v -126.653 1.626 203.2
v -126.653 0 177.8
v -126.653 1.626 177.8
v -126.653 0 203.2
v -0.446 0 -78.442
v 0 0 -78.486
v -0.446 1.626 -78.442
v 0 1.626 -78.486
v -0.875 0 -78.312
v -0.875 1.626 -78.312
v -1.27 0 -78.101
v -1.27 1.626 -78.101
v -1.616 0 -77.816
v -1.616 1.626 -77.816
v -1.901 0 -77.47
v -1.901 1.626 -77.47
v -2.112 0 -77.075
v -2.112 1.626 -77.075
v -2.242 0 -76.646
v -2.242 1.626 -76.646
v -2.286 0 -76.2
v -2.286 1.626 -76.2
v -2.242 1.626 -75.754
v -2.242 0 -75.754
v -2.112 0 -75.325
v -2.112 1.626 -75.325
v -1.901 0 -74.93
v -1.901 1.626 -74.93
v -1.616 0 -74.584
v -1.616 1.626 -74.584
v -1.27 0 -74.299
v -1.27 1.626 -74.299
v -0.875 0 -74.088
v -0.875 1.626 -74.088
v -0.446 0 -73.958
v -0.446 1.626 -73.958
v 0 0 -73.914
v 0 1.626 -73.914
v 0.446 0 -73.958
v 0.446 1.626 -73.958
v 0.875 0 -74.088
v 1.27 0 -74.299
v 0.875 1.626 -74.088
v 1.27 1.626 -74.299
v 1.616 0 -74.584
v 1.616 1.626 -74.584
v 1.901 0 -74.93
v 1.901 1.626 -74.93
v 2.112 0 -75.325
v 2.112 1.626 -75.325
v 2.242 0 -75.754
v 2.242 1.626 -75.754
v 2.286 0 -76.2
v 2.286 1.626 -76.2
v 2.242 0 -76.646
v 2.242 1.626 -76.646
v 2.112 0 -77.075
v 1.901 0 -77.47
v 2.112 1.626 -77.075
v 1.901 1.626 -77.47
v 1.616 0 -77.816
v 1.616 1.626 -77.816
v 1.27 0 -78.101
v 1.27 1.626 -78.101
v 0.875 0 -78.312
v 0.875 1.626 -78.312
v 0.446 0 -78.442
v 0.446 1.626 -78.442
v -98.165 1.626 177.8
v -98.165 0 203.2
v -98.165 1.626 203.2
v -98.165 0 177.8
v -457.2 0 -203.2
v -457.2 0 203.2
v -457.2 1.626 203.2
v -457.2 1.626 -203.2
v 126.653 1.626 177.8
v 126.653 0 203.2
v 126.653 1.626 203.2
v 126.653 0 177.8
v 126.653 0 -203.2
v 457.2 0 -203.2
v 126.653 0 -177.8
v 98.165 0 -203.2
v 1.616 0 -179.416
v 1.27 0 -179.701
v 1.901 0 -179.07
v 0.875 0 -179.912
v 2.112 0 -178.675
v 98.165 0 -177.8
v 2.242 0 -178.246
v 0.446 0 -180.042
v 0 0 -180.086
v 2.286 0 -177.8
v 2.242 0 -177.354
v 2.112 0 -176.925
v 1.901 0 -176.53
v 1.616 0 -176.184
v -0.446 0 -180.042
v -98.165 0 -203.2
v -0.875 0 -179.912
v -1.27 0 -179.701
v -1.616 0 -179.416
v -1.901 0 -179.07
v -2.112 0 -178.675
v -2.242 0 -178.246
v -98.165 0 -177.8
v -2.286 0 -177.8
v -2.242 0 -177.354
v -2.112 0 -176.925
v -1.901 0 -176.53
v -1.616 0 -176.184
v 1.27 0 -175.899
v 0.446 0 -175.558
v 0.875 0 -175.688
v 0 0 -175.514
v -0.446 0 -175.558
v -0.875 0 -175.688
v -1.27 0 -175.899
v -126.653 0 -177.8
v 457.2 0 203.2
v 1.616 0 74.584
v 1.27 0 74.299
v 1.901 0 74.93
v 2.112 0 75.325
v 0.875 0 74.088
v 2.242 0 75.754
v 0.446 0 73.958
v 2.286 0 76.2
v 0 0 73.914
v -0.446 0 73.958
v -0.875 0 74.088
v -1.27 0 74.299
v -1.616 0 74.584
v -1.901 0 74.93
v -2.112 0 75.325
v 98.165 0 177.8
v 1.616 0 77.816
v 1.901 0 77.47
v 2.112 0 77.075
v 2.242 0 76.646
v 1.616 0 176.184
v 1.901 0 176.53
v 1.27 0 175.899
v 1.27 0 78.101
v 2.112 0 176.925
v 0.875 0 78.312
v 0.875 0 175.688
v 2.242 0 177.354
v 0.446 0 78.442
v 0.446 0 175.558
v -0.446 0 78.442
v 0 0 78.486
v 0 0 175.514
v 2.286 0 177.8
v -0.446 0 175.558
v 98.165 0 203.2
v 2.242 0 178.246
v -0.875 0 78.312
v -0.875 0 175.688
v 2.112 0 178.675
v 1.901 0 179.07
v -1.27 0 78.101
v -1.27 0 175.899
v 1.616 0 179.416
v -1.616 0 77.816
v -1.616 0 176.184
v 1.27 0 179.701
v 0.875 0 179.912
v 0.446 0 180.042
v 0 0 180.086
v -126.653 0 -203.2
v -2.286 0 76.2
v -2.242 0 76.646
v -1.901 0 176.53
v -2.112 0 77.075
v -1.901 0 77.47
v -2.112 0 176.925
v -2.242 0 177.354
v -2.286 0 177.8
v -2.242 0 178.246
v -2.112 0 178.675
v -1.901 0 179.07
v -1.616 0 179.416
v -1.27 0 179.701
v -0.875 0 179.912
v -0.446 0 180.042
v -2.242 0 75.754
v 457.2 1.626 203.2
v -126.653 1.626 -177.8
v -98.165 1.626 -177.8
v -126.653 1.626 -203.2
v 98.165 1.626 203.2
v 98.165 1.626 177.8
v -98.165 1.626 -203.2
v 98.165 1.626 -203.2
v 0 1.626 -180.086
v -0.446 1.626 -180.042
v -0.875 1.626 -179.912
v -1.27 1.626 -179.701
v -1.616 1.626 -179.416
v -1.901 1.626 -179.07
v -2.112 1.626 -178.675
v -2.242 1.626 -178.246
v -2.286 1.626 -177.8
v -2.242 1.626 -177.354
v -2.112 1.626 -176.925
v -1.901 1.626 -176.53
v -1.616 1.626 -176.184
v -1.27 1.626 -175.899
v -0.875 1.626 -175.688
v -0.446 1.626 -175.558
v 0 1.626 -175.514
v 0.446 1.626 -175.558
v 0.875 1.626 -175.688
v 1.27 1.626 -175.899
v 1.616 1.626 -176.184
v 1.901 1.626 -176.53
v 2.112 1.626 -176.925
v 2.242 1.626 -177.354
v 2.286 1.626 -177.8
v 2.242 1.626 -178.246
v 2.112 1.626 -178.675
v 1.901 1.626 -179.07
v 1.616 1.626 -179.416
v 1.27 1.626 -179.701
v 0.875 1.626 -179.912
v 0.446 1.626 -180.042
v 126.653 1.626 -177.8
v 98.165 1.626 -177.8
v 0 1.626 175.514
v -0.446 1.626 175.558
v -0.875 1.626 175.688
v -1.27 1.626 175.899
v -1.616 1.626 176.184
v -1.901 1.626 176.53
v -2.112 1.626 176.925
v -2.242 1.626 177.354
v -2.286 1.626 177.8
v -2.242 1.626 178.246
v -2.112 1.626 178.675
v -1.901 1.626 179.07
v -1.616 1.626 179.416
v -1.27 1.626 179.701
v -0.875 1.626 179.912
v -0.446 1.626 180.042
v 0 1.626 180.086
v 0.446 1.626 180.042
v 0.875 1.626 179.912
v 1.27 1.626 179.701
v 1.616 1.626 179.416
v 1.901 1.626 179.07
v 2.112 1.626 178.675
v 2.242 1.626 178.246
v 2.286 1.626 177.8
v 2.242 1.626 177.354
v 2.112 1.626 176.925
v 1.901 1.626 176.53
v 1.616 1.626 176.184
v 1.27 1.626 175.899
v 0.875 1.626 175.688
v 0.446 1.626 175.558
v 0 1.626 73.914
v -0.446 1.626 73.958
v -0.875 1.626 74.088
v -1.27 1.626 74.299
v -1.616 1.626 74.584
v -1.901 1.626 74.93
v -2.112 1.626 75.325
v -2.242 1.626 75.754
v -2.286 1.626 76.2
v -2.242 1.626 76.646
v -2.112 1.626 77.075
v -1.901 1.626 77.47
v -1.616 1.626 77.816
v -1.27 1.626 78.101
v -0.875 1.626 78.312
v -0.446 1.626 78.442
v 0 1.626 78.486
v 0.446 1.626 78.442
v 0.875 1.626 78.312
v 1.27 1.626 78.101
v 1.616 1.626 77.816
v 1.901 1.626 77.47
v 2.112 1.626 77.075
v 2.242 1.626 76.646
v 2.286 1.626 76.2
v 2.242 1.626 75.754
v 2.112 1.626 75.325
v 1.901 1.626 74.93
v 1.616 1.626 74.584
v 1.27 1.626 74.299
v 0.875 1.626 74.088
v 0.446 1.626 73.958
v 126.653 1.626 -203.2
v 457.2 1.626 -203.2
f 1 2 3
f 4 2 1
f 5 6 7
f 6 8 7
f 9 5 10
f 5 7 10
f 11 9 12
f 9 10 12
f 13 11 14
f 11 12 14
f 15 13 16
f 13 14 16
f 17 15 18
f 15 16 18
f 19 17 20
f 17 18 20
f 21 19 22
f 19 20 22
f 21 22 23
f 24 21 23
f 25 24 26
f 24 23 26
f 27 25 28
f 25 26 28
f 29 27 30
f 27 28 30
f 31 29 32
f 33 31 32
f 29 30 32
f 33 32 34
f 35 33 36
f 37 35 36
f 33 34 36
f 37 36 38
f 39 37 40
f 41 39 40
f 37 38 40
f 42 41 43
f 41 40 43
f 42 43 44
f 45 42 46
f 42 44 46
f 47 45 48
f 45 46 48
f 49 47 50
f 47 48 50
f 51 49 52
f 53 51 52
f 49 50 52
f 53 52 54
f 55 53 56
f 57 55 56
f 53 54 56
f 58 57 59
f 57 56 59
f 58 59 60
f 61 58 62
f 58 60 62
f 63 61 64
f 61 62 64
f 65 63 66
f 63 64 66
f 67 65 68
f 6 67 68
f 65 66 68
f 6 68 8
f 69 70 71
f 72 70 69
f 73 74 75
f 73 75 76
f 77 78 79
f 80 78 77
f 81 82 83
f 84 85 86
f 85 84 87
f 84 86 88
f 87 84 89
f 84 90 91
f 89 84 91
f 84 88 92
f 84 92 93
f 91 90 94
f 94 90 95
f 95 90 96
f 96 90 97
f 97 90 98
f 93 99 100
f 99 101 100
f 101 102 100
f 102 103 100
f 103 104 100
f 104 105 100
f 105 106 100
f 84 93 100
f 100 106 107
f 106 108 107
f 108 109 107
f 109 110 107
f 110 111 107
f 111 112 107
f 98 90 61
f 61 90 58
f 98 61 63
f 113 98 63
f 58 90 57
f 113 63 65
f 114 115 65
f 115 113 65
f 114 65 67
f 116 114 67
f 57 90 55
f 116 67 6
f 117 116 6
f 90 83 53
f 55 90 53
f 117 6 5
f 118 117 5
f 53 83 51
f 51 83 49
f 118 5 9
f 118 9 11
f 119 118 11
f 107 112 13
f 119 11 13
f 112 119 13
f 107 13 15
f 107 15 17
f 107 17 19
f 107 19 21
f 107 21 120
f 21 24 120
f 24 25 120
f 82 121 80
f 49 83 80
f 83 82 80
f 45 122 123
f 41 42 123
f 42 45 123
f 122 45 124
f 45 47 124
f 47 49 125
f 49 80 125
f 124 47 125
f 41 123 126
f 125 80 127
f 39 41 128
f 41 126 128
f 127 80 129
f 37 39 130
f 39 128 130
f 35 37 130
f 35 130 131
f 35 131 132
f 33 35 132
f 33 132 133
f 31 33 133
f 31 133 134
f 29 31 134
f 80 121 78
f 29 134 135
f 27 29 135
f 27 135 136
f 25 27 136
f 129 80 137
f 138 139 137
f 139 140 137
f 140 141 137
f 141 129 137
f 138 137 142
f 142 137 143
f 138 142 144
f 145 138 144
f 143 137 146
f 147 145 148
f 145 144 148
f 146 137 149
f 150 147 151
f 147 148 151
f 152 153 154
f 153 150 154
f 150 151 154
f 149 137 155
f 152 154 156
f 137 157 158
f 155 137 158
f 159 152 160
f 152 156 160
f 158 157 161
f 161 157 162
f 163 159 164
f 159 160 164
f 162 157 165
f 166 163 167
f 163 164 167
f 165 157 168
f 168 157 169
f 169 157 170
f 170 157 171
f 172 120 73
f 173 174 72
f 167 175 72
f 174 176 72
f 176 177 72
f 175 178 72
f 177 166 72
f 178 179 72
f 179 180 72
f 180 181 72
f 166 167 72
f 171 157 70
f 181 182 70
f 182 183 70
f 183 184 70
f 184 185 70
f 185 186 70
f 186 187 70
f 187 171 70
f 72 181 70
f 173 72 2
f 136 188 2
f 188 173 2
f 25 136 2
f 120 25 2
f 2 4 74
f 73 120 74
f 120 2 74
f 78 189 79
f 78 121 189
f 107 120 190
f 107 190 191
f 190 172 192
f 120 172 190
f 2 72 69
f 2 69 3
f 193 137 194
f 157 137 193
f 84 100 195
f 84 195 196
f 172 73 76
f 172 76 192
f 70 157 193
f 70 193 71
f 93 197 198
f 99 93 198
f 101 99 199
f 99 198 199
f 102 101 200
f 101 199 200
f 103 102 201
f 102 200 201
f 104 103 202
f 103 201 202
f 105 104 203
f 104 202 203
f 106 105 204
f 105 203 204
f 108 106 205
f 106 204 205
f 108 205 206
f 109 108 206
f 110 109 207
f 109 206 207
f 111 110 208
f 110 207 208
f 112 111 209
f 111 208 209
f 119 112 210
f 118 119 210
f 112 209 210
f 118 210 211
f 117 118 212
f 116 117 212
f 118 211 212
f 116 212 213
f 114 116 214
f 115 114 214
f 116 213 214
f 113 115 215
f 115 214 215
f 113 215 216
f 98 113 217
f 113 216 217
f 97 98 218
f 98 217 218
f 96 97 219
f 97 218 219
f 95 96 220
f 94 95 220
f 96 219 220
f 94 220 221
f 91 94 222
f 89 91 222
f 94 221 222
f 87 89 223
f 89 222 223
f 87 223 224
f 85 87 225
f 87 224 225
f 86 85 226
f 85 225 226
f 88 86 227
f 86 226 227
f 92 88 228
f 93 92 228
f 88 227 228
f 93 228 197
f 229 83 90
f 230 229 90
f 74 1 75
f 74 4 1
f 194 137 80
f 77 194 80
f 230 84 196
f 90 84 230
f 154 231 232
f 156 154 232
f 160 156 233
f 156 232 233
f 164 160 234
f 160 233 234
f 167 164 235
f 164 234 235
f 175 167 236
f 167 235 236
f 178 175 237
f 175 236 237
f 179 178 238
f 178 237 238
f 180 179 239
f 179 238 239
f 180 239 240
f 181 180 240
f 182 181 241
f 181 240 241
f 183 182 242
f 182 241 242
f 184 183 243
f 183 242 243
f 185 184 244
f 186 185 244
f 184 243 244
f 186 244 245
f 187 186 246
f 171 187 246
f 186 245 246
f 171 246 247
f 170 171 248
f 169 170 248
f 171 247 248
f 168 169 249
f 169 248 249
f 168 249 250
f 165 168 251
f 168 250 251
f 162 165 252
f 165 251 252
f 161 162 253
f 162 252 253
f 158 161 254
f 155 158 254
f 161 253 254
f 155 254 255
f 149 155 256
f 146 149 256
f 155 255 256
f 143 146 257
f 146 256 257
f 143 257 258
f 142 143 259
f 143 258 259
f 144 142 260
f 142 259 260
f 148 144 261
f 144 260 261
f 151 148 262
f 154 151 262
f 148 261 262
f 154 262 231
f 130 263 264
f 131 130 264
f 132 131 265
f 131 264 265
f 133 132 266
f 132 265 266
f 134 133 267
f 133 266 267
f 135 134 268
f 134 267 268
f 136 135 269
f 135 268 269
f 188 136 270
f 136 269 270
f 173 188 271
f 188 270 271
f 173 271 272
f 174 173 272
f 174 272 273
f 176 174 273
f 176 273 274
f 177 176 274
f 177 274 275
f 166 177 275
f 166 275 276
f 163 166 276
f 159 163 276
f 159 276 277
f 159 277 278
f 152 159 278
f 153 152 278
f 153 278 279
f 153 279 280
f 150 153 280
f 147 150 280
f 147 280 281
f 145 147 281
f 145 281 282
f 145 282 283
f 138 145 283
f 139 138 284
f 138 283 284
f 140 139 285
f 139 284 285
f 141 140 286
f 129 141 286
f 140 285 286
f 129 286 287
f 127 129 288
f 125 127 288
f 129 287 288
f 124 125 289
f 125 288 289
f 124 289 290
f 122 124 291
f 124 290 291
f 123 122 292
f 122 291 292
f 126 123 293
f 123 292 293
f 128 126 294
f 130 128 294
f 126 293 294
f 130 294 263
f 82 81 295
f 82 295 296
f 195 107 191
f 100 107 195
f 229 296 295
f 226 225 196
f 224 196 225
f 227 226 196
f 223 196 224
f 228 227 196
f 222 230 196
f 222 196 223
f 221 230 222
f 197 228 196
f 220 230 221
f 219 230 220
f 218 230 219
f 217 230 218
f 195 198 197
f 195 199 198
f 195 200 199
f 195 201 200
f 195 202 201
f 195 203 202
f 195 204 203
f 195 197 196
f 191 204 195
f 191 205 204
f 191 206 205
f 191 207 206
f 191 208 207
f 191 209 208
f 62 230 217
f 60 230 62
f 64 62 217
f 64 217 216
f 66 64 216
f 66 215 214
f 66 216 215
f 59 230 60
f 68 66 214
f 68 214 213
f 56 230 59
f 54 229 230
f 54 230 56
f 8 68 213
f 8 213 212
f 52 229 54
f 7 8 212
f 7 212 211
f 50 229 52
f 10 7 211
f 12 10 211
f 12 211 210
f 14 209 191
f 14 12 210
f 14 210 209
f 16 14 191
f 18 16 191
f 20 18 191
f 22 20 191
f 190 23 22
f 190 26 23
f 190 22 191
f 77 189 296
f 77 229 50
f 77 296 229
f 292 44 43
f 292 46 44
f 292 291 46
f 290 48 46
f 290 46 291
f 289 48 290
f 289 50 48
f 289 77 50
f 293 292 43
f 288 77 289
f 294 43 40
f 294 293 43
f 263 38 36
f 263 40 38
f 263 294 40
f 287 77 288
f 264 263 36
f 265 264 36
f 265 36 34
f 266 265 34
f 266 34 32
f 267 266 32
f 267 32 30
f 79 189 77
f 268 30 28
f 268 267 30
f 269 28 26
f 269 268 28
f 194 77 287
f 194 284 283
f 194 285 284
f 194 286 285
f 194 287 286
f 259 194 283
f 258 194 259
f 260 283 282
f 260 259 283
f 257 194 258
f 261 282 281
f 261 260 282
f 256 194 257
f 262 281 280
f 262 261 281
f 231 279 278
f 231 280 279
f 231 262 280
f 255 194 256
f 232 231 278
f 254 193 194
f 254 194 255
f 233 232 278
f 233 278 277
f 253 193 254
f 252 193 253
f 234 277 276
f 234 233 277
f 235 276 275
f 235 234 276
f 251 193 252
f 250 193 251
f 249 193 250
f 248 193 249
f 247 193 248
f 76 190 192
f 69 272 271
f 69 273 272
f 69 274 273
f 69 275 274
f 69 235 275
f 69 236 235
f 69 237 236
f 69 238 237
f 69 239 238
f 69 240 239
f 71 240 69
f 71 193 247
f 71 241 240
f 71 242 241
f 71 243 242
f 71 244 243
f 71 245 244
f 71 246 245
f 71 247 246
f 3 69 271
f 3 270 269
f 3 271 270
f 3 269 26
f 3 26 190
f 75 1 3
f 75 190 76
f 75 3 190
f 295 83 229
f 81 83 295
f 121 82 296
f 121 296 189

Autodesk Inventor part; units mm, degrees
ref_plane "YZ Plane" through (0, 0, 0) normal (1, 0, 0) x (0, 1, 0)
ref_plane "XZ Plane" through (0, 0, 0) normal (0, 1, 0) x (-1, 0, 0)
ref_plane "XY Plane" through (0, 0, 0) normal (0, 0, 1) x (1, 0, 0)
sketch "Sketch1" plane through (0, 0, 0) normal (0, 1, 0) x (-1, 0, 0)
  line L0 (98.1647, -203.2) -> (-98.1647, -203.2)
  line L1 (-98.1647, -203.2) -> (-98.1647, 203.2)
  line L2 (-98.1647, 203.2) -> (98.1647, 203.2)
  line L3 (98.1647, 203.2) -> (98.1647, -203.2)
  line L4 (457.2, -203.2) -> (126.6529, -203.2)
  line L5 (126.6529, -203.2) -> (126.6529, 203.2)
  line L6 (126.6529, 203.2) -> (457.2, 203.2)
  line L7 (457.2, 203.2) -> (457.2, -203.2)
  line L8 (126.6529, -177.8) -> (98.1647, -177.8)
  line L9 (98.1647, -177.8) -> (98.1647, 177.8)
  line L10 (98.1647, 177.8) -> (126.6529, 177.8)
  line L11 (126.6529, 177.8) -> (126.6529, -177.8)
  line L12 (-98.1647, 177.8) -> (-126.6529, 177.8)
  line L13 (-126.6529, 177.8) -> (-126.6529, -177.8)
  line L14 (-126.6529, -177.8) -> (-98.1647, -177.8)
  line L15 (-98.1647, -177.8) -> (-98.1647, 177.8)
  line L16 (-126.6529, -203.2) -> (-457.2, -203.2)
  line L17 (-457.2, -203.2) -> (-457.2, 203.2)
  line L18 (-457.2, 203.2) -> (-126.6529, 203.2)
  line L19 (-126.6529, 203.2) -> (-126.6529, -203.2)
  point P0 (0, 0)
  point P1 (0, -203.2)
  point P2 (98.1647, 0)
  point P3 (98.1647, 0)
  point P4 (0, -76.2)
  point P5 (0, 76.2)
  point P6 (0, -177.8)
  point P7 (0, 177.8)
  dimension "d0" = 25.4
  dimension "d1" = 28.4882
  dimension "d3" = 196.3293
  dimension "d4" = 406.4
  dimension "d5" = 914.4
  dimension "d8" = 101.6
  dimension "d9" = 101.6
  dimension "d10" = 25.4
  dimension "d11" = 25.4
extrude "Extrusion1" add sketch "Sketch1" along normal blind 1.6256
hole "Hole1" at (0, 0, -76.2) at (0, 0, 76.2) at (0, 0, -177.8) at (0, 0, 177.8) direction (0, 1, 0) diameter 4.572 end through all
equation "\"d9\" = d8"
equation "\"d11\" = d10"
properties part number "Flat Ramp Using 1__16 Gray Tinted Polycarbonate Sheet (36 x 72) (217-6627)"
